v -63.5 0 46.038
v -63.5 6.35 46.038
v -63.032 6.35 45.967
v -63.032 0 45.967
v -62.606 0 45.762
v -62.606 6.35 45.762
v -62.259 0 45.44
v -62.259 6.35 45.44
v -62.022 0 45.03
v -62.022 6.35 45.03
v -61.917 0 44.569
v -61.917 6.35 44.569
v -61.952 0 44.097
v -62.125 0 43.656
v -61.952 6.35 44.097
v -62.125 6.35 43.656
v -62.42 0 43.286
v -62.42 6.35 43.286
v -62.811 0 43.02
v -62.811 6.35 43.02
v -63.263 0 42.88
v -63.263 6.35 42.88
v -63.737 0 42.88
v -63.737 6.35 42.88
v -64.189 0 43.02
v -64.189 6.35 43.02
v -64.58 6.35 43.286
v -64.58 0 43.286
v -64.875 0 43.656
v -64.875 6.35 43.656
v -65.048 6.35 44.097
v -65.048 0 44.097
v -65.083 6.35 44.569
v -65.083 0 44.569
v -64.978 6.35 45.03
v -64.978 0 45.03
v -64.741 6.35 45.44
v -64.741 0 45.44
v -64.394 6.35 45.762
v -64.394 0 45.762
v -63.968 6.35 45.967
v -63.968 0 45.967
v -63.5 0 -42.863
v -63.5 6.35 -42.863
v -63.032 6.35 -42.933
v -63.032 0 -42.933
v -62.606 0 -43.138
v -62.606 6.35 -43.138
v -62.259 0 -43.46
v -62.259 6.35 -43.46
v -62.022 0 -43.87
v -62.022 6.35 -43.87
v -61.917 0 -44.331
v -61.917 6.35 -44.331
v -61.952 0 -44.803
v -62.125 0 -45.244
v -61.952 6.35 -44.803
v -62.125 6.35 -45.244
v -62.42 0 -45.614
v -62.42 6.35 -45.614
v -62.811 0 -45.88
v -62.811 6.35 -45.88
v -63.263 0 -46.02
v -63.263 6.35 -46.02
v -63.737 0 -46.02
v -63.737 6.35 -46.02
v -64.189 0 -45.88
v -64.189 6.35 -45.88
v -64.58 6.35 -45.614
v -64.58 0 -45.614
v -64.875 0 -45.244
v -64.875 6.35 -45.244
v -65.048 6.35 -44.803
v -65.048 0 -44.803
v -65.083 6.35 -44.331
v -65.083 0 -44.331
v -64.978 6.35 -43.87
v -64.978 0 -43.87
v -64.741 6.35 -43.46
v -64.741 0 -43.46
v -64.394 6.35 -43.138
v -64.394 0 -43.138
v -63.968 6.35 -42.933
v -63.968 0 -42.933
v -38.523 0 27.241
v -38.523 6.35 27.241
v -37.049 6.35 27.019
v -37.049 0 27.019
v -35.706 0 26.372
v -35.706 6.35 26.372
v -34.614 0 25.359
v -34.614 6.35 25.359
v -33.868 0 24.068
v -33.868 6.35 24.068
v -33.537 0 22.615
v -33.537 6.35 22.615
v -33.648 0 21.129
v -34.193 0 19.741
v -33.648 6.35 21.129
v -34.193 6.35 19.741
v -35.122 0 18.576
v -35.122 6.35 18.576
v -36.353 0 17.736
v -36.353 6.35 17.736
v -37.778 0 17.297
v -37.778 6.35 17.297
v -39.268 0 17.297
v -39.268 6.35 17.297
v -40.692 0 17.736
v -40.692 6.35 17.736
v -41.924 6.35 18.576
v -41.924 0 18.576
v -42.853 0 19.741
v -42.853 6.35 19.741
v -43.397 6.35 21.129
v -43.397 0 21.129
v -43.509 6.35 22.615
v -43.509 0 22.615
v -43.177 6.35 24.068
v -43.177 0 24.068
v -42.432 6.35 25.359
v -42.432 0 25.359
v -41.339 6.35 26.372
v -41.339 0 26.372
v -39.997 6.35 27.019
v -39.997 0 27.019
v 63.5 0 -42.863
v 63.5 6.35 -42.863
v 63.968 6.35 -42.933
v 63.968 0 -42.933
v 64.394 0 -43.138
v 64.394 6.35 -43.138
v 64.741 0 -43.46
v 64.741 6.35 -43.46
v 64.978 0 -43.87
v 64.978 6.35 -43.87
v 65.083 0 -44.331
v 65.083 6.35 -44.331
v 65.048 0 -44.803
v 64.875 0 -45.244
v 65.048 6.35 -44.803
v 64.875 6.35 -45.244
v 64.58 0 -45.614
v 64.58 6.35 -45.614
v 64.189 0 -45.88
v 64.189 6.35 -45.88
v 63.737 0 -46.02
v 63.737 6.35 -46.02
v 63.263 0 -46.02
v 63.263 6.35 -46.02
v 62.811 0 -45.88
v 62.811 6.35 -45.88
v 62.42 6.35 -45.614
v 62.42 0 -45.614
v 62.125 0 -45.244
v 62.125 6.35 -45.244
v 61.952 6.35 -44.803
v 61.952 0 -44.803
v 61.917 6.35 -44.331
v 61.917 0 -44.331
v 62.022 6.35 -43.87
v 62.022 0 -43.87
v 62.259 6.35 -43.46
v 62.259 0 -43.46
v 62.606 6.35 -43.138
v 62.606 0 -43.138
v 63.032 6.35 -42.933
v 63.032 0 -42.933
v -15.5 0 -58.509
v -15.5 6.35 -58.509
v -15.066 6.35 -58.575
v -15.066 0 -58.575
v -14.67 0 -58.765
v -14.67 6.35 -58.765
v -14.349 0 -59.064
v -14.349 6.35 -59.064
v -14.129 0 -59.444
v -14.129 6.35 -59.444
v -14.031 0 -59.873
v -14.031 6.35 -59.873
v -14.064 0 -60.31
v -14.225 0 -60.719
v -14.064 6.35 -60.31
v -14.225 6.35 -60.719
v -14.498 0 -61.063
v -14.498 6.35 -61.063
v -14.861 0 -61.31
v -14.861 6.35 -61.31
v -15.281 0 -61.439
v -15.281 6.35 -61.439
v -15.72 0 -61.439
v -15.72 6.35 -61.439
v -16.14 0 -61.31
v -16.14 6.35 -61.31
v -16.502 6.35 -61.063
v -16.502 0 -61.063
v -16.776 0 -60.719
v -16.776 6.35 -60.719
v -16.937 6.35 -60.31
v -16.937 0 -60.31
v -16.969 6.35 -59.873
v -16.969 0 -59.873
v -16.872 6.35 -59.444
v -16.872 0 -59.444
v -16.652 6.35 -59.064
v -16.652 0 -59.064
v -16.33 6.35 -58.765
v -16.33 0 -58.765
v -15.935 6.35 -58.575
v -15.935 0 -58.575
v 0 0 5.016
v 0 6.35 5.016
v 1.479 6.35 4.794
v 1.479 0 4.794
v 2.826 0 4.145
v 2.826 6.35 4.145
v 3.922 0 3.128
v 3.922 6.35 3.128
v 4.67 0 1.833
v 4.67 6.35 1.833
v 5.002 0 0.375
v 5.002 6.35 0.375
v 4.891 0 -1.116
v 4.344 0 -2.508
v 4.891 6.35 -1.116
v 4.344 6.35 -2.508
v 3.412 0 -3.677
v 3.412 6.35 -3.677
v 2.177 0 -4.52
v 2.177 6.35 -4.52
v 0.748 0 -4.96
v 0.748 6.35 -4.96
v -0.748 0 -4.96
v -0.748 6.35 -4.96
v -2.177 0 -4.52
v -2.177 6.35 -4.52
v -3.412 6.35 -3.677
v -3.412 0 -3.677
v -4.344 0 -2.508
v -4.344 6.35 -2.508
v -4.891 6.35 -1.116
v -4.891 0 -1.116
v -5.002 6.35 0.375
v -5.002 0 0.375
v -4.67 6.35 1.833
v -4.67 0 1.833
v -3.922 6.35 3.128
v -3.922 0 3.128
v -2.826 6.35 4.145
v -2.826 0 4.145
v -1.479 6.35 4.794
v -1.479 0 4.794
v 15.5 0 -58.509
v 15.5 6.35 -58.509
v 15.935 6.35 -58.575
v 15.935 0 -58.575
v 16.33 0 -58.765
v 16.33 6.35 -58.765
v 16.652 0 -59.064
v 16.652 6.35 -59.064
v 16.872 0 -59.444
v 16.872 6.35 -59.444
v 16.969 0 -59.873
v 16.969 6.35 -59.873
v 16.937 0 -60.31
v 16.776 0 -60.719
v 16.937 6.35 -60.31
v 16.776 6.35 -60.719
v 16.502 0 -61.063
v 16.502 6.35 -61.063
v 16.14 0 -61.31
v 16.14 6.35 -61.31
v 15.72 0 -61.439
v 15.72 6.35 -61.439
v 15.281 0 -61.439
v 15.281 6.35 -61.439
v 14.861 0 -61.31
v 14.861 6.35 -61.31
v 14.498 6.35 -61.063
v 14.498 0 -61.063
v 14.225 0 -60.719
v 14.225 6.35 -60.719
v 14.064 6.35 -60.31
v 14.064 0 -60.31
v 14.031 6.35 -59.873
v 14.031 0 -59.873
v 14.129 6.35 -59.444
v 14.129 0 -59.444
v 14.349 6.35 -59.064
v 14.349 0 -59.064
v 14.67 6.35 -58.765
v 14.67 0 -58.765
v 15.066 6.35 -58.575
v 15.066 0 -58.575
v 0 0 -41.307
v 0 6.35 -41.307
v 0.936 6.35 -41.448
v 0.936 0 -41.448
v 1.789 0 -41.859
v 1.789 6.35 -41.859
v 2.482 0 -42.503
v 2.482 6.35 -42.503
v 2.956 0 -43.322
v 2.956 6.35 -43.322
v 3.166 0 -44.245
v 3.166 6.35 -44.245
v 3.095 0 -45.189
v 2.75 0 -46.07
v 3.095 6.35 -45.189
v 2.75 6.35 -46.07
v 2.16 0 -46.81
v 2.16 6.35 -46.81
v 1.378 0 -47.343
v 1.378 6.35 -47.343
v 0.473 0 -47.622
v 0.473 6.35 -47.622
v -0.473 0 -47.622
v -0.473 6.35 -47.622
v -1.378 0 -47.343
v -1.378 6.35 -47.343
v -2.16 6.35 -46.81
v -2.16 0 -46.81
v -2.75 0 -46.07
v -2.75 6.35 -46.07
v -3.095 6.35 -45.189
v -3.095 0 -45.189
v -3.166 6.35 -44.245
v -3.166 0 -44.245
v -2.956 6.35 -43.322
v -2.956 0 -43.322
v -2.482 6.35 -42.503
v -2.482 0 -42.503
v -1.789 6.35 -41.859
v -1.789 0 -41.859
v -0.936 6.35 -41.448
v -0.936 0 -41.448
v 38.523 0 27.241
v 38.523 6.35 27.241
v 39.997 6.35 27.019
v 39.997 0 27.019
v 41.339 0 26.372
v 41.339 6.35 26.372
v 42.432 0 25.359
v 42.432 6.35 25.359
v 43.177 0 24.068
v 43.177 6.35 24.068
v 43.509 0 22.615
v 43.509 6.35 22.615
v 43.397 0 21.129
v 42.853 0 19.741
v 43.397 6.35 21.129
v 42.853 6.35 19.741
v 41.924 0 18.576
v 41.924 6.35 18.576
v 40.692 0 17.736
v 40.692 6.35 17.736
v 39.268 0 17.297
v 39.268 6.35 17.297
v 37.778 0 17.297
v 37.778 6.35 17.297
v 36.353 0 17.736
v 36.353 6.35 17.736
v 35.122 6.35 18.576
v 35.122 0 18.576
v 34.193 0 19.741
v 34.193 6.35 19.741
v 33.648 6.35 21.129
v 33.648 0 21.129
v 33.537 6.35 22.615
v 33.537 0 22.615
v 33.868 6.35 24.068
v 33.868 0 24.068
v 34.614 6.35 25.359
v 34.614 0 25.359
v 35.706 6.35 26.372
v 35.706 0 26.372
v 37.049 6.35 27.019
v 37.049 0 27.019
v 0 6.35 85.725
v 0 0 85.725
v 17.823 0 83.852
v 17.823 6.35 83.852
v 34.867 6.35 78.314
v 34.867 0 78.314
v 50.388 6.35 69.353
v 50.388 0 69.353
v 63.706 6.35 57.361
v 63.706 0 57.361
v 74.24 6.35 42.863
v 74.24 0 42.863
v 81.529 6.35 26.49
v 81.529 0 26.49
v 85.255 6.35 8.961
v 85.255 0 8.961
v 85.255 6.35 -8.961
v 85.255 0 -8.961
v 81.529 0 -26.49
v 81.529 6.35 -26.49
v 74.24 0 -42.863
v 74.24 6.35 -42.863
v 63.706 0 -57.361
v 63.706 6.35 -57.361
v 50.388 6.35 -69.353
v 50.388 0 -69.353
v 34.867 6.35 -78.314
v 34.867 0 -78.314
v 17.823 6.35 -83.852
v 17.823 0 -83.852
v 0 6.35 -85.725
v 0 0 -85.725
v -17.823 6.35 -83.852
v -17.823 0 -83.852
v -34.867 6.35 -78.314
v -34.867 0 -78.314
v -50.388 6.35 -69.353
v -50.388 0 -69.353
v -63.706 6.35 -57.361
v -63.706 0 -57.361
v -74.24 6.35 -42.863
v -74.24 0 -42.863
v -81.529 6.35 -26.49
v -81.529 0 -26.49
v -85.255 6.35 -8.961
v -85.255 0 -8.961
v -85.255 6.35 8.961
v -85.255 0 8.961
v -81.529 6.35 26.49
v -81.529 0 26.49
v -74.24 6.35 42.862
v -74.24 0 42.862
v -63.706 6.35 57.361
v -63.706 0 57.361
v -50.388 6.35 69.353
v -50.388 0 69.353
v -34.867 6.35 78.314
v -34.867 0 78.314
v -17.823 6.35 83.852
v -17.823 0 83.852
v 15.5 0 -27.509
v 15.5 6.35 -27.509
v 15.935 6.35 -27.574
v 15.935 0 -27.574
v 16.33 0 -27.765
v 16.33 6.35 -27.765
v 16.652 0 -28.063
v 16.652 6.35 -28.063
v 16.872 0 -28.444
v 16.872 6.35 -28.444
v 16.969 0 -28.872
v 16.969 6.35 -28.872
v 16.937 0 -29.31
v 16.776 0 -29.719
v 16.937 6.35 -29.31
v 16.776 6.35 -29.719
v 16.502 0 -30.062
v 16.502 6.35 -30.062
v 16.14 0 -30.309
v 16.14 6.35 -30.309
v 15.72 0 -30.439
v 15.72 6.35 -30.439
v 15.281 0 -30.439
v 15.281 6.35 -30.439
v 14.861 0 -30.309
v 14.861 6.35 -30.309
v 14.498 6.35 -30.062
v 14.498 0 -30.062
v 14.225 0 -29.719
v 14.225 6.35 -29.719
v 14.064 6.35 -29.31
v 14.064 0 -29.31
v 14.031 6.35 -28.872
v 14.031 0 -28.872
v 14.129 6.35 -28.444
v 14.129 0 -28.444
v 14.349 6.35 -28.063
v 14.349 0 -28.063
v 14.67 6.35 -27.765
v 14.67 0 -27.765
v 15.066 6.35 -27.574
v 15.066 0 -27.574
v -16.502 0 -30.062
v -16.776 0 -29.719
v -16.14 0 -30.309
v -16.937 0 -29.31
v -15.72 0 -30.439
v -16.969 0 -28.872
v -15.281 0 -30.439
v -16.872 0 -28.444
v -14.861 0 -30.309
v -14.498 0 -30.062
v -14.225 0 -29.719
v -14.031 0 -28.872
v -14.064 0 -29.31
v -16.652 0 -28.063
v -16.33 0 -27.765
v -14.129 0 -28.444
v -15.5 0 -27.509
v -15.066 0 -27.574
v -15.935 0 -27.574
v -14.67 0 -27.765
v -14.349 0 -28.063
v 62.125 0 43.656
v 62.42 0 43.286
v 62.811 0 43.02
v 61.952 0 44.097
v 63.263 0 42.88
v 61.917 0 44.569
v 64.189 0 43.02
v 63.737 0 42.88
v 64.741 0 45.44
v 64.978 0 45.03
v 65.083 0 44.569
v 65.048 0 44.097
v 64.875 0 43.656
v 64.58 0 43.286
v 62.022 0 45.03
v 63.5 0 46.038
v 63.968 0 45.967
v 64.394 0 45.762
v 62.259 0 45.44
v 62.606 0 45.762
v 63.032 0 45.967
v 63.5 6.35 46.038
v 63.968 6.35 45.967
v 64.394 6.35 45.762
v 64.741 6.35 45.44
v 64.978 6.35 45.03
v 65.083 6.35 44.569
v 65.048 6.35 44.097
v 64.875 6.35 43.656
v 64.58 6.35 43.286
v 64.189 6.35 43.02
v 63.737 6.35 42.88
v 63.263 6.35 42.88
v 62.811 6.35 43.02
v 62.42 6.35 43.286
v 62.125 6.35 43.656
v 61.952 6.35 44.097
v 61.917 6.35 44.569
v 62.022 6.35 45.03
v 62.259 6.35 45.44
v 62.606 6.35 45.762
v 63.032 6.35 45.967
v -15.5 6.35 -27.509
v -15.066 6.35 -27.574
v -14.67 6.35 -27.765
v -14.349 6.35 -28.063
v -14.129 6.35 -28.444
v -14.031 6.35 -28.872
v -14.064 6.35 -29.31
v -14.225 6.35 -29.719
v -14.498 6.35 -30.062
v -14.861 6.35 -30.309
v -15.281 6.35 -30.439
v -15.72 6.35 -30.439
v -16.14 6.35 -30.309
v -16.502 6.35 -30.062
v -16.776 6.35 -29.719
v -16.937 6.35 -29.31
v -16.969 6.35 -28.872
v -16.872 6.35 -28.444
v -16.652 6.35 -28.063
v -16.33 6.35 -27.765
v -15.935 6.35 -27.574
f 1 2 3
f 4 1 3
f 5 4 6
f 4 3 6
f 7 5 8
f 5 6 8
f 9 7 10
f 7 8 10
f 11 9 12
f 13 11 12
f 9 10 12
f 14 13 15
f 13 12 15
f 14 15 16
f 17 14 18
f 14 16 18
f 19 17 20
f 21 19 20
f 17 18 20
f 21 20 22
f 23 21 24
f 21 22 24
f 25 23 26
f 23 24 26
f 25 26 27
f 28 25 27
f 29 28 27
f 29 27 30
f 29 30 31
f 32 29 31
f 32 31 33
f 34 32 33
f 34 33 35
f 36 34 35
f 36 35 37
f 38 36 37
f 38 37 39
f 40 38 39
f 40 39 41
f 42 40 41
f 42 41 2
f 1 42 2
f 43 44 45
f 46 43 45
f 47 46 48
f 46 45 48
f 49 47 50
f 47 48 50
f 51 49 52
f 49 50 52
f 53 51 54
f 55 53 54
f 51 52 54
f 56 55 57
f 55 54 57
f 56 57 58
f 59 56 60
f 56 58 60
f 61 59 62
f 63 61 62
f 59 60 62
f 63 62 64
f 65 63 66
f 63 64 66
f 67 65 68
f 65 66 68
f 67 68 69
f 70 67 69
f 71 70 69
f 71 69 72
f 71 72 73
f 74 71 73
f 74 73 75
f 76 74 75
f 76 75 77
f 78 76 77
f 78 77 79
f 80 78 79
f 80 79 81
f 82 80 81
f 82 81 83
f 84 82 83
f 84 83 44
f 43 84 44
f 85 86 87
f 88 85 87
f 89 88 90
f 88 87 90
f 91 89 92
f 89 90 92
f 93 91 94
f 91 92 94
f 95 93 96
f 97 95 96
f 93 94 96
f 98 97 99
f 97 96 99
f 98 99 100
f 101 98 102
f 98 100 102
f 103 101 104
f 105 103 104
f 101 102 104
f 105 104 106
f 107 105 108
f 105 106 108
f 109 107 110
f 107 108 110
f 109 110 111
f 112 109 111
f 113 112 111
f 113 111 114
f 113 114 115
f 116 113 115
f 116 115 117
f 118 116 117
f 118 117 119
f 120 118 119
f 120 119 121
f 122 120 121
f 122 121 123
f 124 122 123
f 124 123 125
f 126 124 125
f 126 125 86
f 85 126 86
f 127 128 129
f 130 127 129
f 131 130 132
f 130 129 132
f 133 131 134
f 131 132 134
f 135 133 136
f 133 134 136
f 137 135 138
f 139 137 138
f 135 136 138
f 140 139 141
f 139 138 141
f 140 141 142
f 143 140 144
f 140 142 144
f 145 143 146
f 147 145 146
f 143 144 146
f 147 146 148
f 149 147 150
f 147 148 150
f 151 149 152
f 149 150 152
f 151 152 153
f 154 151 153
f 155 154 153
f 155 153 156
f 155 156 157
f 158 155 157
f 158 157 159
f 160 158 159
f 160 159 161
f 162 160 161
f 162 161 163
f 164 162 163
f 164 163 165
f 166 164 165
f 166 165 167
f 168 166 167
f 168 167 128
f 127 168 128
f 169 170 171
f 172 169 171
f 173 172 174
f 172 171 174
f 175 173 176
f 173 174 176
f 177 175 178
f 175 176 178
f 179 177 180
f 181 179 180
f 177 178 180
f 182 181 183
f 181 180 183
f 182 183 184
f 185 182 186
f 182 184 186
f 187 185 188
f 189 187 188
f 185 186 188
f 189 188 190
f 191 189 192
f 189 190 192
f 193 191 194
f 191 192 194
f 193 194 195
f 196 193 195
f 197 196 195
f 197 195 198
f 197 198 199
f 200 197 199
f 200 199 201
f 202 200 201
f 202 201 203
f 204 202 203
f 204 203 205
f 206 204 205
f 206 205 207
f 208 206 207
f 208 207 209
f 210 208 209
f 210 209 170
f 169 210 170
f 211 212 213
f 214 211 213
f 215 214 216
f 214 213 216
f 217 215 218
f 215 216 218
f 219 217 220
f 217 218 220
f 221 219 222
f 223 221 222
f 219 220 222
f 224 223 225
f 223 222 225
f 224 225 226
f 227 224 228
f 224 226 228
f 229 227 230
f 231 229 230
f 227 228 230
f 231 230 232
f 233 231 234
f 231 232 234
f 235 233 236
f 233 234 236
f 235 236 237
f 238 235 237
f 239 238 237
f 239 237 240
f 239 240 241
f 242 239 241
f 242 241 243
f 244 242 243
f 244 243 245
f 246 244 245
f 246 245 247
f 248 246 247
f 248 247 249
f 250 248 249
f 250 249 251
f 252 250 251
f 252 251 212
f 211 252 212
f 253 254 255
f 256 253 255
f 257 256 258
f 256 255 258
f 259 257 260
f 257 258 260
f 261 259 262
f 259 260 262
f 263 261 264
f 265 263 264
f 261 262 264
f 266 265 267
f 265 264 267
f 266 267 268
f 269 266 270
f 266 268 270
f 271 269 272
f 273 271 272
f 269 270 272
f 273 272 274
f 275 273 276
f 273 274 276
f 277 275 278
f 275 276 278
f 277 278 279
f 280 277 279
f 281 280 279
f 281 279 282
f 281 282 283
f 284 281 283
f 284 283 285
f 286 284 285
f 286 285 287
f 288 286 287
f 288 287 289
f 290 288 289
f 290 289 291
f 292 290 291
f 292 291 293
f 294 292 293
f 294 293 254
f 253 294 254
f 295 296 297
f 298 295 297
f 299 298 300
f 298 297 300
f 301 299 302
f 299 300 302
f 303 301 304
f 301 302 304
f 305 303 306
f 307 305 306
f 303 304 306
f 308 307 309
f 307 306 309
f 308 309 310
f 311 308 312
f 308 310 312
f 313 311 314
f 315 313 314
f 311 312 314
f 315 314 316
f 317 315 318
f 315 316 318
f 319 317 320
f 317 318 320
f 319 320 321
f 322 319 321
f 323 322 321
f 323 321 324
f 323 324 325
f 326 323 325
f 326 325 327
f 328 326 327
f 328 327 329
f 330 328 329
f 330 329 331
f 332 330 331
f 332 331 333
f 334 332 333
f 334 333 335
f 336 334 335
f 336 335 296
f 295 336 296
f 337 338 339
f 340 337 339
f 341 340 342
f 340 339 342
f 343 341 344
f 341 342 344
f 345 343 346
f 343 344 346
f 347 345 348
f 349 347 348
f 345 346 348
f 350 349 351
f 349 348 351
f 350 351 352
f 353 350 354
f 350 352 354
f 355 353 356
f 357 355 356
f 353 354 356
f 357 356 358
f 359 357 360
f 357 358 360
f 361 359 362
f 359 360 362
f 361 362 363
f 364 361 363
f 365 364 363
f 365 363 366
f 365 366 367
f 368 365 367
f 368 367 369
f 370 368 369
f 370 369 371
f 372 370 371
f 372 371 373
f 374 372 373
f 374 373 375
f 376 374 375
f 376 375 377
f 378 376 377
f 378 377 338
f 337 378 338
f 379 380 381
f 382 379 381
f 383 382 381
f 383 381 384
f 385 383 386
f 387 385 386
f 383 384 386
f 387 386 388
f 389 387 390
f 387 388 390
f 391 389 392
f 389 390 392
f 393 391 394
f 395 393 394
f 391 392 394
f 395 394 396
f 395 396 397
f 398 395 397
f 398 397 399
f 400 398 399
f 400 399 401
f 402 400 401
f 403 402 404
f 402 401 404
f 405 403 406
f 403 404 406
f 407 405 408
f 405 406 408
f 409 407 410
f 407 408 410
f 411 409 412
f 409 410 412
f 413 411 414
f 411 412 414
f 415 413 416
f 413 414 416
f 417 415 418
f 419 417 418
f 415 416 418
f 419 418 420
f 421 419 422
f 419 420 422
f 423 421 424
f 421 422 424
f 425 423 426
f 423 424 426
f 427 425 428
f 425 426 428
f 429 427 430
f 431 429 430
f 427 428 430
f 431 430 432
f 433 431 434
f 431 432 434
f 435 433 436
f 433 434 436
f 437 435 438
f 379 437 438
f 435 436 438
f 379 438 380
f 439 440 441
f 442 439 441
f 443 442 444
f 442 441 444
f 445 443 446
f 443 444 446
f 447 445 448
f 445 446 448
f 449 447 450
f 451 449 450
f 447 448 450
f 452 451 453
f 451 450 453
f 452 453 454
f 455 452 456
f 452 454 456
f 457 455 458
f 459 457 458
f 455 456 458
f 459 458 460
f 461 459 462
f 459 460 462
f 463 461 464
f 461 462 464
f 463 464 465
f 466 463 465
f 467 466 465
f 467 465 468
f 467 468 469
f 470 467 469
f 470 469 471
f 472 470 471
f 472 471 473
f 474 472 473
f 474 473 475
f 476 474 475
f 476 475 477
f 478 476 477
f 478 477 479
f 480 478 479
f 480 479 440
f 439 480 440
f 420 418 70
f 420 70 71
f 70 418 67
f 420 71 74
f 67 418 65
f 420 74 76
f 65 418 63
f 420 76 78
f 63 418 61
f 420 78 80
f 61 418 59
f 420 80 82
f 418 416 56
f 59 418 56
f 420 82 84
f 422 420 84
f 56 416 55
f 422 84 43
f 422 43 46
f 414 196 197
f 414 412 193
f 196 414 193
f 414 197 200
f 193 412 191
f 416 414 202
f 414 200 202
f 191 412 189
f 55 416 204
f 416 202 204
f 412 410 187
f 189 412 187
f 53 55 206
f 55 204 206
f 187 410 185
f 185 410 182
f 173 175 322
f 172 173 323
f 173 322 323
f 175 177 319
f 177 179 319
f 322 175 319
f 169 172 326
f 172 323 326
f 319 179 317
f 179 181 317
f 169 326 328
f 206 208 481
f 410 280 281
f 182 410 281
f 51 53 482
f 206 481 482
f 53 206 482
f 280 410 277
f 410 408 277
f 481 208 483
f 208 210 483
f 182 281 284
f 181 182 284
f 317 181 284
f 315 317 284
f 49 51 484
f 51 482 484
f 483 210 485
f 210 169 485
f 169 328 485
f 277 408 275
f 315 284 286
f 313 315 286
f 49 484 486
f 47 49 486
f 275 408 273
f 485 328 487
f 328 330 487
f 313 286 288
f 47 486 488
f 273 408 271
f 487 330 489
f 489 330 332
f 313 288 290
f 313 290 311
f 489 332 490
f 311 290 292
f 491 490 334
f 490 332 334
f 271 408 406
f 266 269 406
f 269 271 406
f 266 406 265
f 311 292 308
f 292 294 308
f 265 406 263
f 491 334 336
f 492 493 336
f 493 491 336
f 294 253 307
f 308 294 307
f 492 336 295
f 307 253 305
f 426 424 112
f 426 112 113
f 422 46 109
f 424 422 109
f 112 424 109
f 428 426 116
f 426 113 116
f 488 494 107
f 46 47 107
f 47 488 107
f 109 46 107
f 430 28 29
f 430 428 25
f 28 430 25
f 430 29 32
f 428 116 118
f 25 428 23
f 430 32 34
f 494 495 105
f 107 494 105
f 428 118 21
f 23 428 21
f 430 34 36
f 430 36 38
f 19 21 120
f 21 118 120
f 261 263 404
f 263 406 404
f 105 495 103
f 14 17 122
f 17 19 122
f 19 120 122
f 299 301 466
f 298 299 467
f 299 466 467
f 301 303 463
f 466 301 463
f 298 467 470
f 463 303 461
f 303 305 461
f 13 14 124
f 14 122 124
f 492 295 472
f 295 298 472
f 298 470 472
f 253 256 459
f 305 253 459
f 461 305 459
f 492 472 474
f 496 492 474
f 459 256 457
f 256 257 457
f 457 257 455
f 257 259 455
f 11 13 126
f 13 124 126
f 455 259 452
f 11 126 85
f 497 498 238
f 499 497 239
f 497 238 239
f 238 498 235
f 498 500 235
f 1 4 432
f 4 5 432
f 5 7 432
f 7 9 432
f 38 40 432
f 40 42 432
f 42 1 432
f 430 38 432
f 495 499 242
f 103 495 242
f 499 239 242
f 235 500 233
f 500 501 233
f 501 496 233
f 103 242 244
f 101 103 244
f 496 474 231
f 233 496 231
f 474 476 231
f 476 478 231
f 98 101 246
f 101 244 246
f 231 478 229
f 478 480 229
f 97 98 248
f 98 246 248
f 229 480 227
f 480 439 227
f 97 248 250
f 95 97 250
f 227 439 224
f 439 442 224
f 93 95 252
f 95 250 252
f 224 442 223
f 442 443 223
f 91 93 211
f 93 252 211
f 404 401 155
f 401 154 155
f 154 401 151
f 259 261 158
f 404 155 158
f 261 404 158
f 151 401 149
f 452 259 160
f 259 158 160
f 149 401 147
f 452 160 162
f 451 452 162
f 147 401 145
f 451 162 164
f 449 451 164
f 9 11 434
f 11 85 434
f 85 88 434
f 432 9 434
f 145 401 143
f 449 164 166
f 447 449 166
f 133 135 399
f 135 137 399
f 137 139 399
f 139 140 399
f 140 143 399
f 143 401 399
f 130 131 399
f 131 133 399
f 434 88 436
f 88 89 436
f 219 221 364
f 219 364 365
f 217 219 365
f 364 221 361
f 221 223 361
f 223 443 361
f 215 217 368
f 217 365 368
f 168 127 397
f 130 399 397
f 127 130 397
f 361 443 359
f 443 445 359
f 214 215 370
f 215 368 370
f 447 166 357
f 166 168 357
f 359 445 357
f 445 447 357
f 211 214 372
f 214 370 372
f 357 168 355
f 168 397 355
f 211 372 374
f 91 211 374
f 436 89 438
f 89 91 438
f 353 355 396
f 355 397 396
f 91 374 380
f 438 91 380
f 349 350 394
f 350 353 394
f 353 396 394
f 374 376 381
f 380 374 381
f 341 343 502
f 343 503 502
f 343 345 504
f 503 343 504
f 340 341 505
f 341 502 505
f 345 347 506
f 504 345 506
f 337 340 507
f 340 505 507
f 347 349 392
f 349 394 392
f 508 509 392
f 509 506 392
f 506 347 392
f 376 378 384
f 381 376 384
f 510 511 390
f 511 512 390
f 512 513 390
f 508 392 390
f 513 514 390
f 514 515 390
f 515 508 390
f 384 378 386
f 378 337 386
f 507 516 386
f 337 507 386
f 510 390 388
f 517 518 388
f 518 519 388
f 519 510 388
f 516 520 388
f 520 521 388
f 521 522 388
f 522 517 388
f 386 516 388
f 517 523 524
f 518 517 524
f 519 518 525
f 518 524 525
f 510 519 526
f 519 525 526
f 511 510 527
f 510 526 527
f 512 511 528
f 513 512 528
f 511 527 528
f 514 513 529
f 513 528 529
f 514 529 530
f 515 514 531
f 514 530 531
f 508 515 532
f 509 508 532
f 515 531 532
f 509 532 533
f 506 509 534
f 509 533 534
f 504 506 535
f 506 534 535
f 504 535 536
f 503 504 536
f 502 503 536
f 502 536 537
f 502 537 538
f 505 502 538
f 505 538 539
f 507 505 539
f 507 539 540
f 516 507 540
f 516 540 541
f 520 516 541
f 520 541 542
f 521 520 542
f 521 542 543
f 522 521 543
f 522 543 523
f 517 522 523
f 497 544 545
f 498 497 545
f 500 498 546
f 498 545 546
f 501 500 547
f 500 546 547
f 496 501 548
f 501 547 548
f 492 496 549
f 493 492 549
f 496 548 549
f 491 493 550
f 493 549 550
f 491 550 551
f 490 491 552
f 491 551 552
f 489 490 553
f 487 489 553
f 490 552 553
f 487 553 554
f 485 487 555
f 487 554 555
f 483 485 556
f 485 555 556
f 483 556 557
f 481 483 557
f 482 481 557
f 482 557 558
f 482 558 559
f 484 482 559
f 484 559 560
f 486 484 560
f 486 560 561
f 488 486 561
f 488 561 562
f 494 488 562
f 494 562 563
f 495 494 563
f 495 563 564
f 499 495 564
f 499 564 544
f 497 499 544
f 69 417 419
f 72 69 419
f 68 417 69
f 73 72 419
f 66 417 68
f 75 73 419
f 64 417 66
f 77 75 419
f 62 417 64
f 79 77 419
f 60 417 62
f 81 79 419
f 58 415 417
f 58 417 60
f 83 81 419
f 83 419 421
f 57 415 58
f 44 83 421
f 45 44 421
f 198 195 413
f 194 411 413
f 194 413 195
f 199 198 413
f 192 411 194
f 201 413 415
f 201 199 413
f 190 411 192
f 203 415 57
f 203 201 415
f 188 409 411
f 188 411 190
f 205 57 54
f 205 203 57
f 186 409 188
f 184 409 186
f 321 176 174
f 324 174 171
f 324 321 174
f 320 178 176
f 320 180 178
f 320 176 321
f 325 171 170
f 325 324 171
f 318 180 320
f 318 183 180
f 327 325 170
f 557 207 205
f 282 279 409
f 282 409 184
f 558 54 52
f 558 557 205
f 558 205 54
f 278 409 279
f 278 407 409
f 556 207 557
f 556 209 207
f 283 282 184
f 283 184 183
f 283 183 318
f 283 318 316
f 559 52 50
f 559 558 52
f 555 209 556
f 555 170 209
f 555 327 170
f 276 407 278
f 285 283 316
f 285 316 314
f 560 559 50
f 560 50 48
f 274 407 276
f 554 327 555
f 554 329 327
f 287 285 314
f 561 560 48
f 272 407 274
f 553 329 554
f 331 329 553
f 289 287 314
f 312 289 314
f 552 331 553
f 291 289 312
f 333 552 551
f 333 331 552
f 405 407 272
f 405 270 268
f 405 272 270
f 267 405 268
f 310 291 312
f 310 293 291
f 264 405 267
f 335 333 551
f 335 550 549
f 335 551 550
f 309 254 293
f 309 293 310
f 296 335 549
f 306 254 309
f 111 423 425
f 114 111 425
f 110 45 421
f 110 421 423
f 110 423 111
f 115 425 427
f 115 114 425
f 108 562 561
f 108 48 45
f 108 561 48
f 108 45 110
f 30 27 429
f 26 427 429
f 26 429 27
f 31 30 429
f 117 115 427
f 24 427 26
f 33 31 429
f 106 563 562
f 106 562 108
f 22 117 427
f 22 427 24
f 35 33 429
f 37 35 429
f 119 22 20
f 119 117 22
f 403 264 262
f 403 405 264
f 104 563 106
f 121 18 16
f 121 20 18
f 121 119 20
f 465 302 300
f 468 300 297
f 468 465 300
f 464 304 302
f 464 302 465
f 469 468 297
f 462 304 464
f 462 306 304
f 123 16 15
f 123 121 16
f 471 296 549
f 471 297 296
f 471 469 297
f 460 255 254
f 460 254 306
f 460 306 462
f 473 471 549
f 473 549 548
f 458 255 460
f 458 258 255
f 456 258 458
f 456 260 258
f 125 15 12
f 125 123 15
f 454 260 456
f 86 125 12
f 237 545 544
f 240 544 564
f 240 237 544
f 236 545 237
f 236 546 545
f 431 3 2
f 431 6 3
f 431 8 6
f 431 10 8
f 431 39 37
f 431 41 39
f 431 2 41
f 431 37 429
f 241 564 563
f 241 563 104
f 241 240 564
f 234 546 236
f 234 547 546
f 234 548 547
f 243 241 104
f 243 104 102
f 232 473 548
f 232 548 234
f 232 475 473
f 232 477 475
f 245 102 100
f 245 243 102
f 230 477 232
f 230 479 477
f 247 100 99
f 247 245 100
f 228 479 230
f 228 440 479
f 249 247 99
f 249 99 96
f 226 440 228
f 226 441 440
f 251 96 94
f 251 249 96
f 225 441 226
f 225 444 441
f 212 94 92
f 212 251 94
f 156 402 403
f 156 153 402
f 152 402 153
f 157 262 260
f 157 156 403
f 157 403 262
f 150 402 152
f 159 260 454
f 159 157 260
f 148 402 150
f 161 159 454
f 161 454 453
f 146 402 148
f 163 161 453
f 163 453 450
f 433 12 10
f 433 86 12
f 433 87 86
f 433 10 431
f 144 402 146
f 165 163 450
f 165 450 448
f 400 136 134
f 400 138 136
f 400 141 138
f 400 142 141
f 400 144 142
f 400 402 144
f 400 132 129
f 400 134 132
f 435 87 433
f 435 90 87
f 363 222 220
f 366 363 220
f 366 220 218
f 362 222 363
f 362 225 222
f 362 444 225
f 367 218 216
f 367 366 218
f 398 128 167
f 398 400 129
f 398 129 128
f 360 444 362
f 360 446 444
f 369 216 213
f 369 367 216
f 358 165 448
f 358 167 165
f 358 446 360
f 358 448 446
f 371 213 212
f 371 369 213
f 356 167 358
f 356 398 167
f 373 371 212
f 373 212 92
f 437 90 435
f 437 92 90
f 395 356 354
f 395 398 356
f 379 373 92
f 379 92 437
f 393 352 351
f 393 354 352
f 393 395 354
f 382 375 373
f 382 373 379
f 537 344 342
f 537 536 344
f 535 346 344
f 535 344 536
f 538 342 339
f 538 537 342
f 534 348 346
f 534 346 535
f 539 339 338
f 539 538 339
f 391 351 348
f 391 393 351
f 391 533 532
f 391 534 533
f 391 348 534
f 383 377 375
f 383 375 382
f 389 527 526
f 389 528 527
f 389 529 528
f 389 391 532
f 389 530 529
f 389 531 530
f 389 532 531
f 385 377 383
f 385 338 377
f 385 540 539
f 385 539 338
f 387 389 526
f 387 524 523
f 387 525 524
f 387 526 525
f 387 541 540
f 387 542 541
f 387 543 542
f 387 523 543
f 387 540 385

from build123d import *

# Parameters (mm, degrees)
SKETCH1_R           = 85.725
BOSS_EXTRUDE1_DEPTH = 6.35
CUT_EXTRUDE1_REACH  = 123.4
SKETCH2_R           = 1.5875
CUT_EXTRUDE2_REACH  = 123.4
SKETCH3_R           = 3.175
SKETCH3_R_2         = 5
CUT_EXTRUDE3_REACH  = 123.4
SKETCH5_R           = 1.4732
CENTER_HOLE_REACH   = 123.4
SKETCH6_R           = 5.0165


with BuildPart() as part:
    # Sketch1 → Boss-Extrude1 (new body)
    with BuildSketch(Plane(origin=(0, 0, 0), x_dir=(1, 0, 0), z_dir=(0, 1, 0))):
        Circle(SKETCH1_R)
    extrude(amount=BOSS_EXTRUDE1_DEPTH)

    # Sketch2 → Cut-Extrude1 (cut, up to next)
    with BuildSketch(Plane(origin=(0, 6.35, 0), x_dir=(1, 0, 0), z_dir=(0, 1, 0)), mode=Mode.PRIVATE) as cut_extrude1_sk1:
        with Locations((-63.5, 44.45)):
            Circle(SKETCH2_R)
    cut_extrude1_tool1 = extrude(cut_extrude1_sk1.sketch, amount=-CUT_EXTRUDE1_REACH, mode=Mode.PRIVATE) & part.part
    # Sketch2 → Cut-Extrude1 (cut, up to next)
    with BuildSketch(Plane(origin=(0, 6.35, 0), x_dir=(1, 0, 0), z_dir=(0, 1, 0)), mode=Mode.PRIVATE) as cut_extrude1_sk2:
        with Locations((63.5, 44.45)):
            Circle(SKETCH2_R)
    cut_extrude1_tool2 = extrude(cut_extrude1_sk2.sketch, amount=-CUT_EXTRUDE1_REACH, mode=Mode.PRIVATE) & part.part
    # Sketch2 → Cut-Extrude1 (cut, up to next)
    with BuildSketch(Plane(origin=(0, 6.35, 0), x_dir=(1, 0, 0), z_dir=(0, 1, 0)), mode=Mode.PRIVATE) as cut_extrude1_sk3:
        with Locations((-63.5, -44.45)):
            Circle(SKETCH2_R)
    cut_extrude1_tool3 = extrude(cut_extrude1_sk3.sketch, amount=-CUT_EXTRUDE1_REACH, mode=Mode.PRIVATE) & part.part
    # Sketch2 → Cut-Extrude1 (cut, up to next)
    with BuildSketch(Plane(origin=(0, 6.35, 0), x_dir=(1, 0, 0), z_dir=(0, 1, 0)), mode=Mode.PRIVATE) as cut_extrude1_sk4:
        with Locations((63.5, -44.45)):
            Circle(SKETCH2_R)
    cut_extrude1_tool4 = extrude(cut_extrude1_sk4.sketch, amount=-CUT_EXTRUDE1_REACH, mode=Mode.PRIVATE) & part.part
    add(cut_extrude1_tool1.solids().sort_by_distance((-63.5, 6.35, -44.45))[0], mode=Mode.SUBTRACT)
    add(cut_extrude1_tool2.solids().sort_by_distance((63.5, 6.35, -44.45))[0], mode=Mode.SUBTRACT)
    add(cut_extrude1_tool3.solids().sort_by_distance((-63.5, 6.35, 44.45))[0], mode=Mode.SUBTRACT)
    add(cut_extrude1_tool4.solids().sort_by_distance((63.5, 6.35, 44.45))[0], mode=Mode.SUBTRACT)

    # Sketch3 → Cut-Extrude2 (cut, up to next)
    with BuildSketch(Plane(origin=(0, 6.35, 0), x_dir=(1, 0, 0), z_dir=(0, 1, 0)), mode=Mode.PRIVATE) as cut_extrude2_sk1:
        with Locations((0, 44.482258)):
            Circle(SKETCH3_R)
    cut_extrude2_tool1 = extrude(cut_extrude2_sk1.sketch, amount=-CUT_EXTRUDE2_REACH, mode=Mode.PRIVATE) & part.part
    # Sketch3 → Cut-Extrude2 (cut, up to next)
    with BuildSketch(Plane(origin=(0, 6.35, 0), x_dir=(1, 0, 0), z_dir=(0, 1, 0)), mode=Mode.PRIVATE) as cut_extrude2_sk2:
        with Locations((-38.522765446, -22.241129)):
            Circle(SKETCH3_R_2)
    cut_extrude2_tool2 = extrude(cut_extrude2_sk2.sketch, amount=-CUT_EXTRUDE2_REACH, mode=Mode.PRIVATE) & part.part
    # Sketch3 → Cut-Extrude2 (cut, up to next)
    with BuildSketch(Plane(origin=(0, 6.35, 0), x_dir=(1, 0, 0), z_dir=(0, 1, 0)), mode=Mode.PRIVATE) as cut_extrude2_sk3:
        with Locations((38.522765446, -22.241129)):
            Circle(SKETCH3_R_2)
    cut_extrude2_tool3 = extrude(cut_extrude2_sk3.sketch, amount=-CUT_EXTRUDE2_REACH, mode=Mode.PRIVATE) & part.part
    add(cut_extrude2_tool1.solids().sort_by_distance((0, 6.35, -44.482258))[0], mode=Mode.SUBTRACT)
    add(cut_extrude2_tool2.solids().sort_by_distance((-38.522765, 6.35, 22.241129))[0], mode=Mode.SUBTRACT)
    add(cut_extrude2_tool3.solids().sort_by_distance((38.522765, 6.35, 22.241129))[0], mode=Mode.SUBTRACT)

    # Sketch5 → Cut-Extrude3 (cut, up to next)
    with BuildSketch(Plane(origin=(0, 6.35, 0), x_dir=(1, 0, 0), z_dir=(0, 1, 0)), mode=Mode.PRIVATE) as cut_extrude3_sk1:
        with Locations((-15.50035, 59.982608)):
            Circle(SKETCH5_R)
    cut_extrude3_tool1 = extrude(cut_extrude3_sk1.sketch, amount=-CUT_EXTRUDE3_REACH, mode=Mode.PRIVATE) & part.part
    # Sketch5 → Cut-Extrude3 (cut, up to next)
    with BuildSketch(Plane(origin=(0, 6.35, 0), x_dir=(1, 0, 0), z_dir=(0, 1, 0)), mode=Mode.PRIVATE) as cut_extrude3_sk2:
        with Locations((15.50035, 59.982608)):
            Circle(SKETCH5_R)
    cut_extrude3_tool2 = extrude(cut_extrude3_sk2.sketch, amount=-CUT_EXTRUDE3_REACH, mode=Mode.PRIVATE) & part.part
    # Sketch5 → Cut-Extrude3 (cut, up to next)
    with BuildSketch(Plane(origin=(0, 6.35, 0), x_dir=(1, 0, 0), z_dir=(0, 1, 0)), mode=Mode.PRIVATE) as cut_extrude3_sk3:
        with Locations((-15.50035, 28.981908)):
            Circle(SKETCH5_R)
    cut_extrude3_tool3 = extrude(cut_extrude3_sk3.sketch, amount=-CUT_EXTRUDE3_REACH, mode=Mode.PRIVATE) & part.part
    # Sketch5 → Cut-Extrude3 (cut, up to next)
    with BuildSketch(Plane(origin=(0, 6.35, 0), x_dir=(1, 0, 0), z_dir=(0, 1, 0)), mode=Mode.PRIVATE) as cut_extrude3_sk4:
        with Locations((15.50035, 28.981908)):
            Circle(SKETCH5_R)
    cut_extrude3_tool4 = extrude(cut_extrude3_sk4.sketch, amount=-CUT_EXTRUDE3_REACH, mode=Mode.PRIVATE) & part.part
    add(cut_extrude3_tool1.solids().sort_by_distance((-15.50035, 6.35, -59.982608))[0], mode=Mode.SUBTRACT)
    add(cut_extrude3_tool2.solids().sort_by_distance((15.50035, 6.35, -59.982608))[0], mode=Mode.SUBTRACT)
    add(cut_extrude3_tool3.solids().sort_by_distance((-15.50035, 6.35, -28.981908))[0], mode=Mode.SUBTRACT)
    add(cut_extrude3_tool4.solids().sort_by_distance((15.50035, 6.35, -28.981908))[0], mode=Mode.SUBTRACT)

    # Sketch6 → center_hole (cut, up to next)
    with BuildSketch(Plane(origin=(0, 6.35, 0), x_dir=(1, 0, 0), z_dir=(0, 1, 0)), mode=Mode.PRIVATE) as center_hole_sk1:
        Circle(SKETCH6_R)
    center_hole_tool1 = extrude(center_hole_sk1.sketch, amount=-CENTER_HOLE_REACH, mode=Mode.PRIVATE) & part.part
    add(center_hole_tool1.solids().sort_by_distance((0, 6.35, 0))[0], mode=Mode.SUBTRACT)


solid = part.part
